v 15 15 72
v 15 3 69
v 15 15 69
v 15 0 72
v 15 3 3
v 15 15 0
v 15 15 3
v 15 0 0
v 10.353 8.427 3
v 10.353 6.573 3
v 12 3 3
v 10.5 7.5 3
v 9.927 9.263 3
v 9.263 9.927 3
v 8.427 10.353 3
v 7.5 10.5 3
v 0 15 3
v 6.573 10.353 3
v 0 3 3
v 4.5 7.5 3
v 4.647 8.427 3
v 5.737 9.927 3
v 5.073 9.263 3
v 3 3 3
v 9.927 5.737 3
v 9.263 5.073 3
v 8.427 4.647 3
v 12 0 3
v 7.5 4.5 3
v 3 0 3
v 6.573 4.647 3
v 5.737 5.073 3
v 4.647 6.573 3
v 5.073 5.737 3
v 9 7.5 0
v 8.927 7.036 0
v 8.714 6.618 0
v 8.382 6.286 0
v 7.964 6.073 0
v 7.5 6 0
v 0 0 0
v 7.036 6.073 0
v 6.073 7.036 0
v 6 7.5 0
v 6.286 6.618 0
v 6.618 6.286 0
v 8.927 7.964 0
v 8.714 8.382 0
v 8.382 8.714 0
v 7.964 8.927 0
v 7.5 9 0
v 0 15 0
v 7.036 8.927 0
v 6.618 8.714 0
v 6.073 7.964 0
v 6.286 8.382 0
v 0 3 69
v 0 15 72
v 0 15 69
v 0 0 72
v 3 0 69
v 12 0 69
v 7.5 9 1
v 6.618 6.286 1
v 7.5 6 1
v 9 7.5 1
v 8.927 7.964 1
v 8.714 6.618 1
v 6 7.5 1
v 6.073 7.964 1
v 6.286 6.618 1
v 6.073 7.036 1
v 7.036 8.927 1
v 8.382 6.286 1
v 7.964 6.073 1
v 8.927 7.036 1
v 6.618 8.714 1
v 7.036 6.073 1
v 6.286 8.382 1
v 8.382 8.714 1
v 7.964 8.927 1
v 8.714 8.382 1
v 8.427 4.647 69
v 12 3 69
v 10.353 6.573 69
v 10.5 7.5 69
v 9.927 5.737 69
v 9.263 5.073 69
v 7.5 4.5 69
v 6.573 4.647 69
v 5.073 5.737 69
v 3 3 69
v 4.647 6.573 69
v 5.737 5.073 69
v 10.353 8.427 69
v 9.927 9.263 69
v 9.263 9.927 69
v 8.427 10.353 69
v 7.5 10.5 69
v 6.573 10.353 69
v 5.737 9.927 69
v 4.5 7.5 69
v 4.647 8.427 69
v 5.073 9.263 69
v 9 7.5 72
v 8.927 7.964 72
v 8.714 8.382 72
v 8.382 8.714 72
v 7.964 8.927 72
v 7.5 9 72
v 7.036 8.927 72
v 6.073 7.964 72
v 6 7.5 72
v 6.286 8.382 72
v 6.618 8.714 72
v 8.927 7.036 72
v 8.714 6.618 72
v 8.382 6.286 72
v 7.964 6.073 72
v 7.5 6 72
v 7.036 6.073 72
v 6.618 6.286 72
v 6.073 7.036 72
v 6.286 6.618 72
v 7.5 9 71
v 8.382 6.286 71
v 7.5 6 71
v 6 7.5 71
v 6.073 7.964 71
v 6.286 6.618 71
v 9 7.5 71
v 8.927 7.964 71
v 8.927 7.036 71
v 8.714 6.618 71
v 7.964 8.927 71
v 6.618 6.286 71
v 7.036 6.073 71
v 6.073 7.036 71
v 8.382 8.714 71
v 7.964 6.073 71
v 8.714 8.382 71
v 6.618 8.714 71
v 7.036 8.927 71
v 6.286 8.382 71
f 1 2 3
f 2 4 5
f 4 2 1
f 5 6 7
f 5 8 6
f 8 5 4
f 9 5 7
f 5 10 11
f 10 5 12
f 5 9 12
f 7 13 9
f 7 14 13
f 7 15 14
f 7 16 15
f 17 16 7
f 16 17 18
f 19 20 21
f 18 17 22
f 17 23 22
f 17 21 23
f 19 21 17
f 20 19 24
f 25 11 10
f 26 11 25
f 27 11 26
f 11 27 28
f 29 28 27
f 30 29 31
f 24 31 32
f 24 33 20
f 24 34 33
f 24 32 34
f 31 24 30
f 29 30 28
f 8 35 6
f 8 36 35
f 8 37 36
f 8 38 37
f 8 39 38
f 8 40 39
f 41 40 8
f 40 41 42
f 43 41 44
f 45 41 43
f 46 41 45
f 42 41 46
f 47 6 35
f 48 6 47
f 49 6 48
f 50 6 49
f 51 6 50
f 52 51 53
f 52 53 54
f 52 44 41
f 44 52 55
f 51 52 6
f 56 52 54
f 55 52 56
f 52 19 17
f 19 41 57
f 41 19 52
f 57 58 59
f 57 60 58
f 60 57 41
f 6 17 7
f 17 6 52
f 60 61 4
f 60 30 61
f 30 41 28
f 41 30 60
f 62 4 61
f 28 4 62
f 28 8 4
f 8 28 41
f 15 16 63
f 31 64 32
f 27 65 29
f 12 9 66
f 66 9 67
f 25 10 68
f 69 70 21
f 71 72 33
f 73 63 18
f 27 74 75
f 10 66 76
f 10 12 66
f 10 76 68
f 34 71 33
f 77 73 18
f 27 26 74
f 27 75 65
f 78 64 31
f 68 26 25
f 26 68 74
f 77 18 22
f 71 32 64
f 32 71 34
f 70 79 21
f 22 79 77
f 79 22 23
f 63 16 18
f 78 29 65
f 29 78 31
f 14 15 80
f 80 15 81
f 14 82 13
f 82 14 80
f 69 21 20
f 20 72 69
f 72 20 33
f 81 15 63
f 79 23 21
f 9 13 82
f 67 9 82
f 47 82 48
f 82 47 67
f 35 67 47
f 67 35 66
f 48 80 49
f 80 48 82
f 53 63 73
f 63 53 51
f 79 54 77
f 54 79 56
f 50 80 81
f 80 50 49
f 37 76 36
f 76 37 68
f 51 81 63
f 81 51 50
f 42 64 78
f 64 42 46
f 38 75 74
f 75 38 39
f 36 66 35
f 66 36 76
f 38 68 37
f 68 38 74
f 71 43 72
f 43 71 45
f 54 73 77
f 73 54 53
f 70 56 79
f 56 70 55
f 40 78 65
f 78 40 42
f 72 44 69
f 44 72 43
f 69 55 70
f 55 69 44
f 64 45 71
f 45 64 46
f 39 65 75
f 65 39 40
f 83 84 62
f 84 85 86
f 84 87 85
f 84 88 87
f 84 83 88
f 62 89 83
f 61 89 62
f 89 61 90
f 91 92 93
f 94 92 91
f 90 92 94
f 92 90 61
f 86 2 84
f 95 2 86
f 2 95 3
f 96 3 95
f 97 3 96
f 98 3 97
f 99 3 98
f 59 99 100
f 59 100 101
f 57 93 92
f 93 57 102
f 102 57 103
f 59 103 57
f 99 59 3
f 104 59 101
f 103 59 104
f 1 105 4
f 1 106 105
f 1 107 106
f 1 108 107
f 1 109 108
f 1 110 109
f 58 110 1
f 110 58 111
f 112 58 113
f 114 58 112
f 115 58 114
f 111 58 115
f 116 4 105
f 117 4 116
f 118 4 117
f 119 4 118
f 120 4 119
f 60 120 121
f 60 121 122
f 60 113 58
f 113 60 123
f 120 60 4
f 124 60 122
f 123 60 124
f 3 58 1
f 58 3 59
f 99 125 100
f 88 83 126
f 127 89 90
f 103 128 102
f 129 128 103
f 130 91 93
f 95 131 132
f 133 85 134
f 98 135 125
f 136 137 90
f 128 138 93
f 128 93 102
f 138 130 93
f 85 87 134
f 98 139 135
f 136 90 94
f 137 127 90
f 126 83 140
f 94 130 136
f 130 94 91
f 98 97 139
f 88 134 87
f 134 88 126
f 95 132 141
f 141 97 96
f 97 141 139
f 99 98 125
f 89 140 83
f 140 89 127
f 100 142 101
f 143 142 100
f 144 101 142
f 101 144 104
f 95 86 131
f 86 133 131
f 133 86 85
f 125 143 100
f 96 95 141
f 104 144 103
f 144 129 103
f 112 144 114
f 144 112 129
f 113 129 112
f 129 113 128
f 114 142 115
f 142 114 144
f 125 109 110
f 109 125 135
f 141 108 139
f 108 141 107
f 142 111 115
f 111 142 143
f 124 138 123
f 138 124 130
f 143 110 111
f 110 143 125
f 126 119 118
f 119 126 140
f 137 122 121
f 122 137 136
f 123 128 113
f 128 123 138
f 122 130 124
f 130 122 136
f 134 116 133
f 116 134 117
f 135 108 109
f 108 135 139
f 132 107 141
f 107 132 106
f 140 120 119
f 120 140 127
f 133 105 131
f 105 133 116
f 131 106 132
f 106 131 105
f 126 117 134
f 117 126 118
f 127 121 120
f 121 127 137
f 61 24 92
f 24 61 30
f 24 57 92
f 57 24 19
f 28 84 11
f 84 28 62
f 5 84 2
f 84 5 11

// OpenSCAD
/*Ender_Lock
Befestigung für PSU Gerüst
20180204 P. de Graaff
*/
Bohrung = 3;//Loch für M3
Hoehe = 72;//Licht Höhe
Wand = 3; //Wandstärke

//Bodenplatte
plate();
//obere Platte
translate([15,0,Hoehe])rotate([0,180,0])plate();
//Streben
cube([Wand,Wand,Hoehe]);
translate([15-Wand,0,0])cube([Wand,Wand,Hoehe]);

//Schraubenplatte
module plate(){
    difference(){
        cube([15,15,Wand]);
        translate([7.5,7.5,Wand-2])cylinder(d1=Bohrung, d2=Bohrung+3,h=2,$fn=20);//Senkloch
        translate([7.5,7.5,-Wand/2])cylinder(d=Bohrung,h=Wand+2,$fn=20);
    }
}
